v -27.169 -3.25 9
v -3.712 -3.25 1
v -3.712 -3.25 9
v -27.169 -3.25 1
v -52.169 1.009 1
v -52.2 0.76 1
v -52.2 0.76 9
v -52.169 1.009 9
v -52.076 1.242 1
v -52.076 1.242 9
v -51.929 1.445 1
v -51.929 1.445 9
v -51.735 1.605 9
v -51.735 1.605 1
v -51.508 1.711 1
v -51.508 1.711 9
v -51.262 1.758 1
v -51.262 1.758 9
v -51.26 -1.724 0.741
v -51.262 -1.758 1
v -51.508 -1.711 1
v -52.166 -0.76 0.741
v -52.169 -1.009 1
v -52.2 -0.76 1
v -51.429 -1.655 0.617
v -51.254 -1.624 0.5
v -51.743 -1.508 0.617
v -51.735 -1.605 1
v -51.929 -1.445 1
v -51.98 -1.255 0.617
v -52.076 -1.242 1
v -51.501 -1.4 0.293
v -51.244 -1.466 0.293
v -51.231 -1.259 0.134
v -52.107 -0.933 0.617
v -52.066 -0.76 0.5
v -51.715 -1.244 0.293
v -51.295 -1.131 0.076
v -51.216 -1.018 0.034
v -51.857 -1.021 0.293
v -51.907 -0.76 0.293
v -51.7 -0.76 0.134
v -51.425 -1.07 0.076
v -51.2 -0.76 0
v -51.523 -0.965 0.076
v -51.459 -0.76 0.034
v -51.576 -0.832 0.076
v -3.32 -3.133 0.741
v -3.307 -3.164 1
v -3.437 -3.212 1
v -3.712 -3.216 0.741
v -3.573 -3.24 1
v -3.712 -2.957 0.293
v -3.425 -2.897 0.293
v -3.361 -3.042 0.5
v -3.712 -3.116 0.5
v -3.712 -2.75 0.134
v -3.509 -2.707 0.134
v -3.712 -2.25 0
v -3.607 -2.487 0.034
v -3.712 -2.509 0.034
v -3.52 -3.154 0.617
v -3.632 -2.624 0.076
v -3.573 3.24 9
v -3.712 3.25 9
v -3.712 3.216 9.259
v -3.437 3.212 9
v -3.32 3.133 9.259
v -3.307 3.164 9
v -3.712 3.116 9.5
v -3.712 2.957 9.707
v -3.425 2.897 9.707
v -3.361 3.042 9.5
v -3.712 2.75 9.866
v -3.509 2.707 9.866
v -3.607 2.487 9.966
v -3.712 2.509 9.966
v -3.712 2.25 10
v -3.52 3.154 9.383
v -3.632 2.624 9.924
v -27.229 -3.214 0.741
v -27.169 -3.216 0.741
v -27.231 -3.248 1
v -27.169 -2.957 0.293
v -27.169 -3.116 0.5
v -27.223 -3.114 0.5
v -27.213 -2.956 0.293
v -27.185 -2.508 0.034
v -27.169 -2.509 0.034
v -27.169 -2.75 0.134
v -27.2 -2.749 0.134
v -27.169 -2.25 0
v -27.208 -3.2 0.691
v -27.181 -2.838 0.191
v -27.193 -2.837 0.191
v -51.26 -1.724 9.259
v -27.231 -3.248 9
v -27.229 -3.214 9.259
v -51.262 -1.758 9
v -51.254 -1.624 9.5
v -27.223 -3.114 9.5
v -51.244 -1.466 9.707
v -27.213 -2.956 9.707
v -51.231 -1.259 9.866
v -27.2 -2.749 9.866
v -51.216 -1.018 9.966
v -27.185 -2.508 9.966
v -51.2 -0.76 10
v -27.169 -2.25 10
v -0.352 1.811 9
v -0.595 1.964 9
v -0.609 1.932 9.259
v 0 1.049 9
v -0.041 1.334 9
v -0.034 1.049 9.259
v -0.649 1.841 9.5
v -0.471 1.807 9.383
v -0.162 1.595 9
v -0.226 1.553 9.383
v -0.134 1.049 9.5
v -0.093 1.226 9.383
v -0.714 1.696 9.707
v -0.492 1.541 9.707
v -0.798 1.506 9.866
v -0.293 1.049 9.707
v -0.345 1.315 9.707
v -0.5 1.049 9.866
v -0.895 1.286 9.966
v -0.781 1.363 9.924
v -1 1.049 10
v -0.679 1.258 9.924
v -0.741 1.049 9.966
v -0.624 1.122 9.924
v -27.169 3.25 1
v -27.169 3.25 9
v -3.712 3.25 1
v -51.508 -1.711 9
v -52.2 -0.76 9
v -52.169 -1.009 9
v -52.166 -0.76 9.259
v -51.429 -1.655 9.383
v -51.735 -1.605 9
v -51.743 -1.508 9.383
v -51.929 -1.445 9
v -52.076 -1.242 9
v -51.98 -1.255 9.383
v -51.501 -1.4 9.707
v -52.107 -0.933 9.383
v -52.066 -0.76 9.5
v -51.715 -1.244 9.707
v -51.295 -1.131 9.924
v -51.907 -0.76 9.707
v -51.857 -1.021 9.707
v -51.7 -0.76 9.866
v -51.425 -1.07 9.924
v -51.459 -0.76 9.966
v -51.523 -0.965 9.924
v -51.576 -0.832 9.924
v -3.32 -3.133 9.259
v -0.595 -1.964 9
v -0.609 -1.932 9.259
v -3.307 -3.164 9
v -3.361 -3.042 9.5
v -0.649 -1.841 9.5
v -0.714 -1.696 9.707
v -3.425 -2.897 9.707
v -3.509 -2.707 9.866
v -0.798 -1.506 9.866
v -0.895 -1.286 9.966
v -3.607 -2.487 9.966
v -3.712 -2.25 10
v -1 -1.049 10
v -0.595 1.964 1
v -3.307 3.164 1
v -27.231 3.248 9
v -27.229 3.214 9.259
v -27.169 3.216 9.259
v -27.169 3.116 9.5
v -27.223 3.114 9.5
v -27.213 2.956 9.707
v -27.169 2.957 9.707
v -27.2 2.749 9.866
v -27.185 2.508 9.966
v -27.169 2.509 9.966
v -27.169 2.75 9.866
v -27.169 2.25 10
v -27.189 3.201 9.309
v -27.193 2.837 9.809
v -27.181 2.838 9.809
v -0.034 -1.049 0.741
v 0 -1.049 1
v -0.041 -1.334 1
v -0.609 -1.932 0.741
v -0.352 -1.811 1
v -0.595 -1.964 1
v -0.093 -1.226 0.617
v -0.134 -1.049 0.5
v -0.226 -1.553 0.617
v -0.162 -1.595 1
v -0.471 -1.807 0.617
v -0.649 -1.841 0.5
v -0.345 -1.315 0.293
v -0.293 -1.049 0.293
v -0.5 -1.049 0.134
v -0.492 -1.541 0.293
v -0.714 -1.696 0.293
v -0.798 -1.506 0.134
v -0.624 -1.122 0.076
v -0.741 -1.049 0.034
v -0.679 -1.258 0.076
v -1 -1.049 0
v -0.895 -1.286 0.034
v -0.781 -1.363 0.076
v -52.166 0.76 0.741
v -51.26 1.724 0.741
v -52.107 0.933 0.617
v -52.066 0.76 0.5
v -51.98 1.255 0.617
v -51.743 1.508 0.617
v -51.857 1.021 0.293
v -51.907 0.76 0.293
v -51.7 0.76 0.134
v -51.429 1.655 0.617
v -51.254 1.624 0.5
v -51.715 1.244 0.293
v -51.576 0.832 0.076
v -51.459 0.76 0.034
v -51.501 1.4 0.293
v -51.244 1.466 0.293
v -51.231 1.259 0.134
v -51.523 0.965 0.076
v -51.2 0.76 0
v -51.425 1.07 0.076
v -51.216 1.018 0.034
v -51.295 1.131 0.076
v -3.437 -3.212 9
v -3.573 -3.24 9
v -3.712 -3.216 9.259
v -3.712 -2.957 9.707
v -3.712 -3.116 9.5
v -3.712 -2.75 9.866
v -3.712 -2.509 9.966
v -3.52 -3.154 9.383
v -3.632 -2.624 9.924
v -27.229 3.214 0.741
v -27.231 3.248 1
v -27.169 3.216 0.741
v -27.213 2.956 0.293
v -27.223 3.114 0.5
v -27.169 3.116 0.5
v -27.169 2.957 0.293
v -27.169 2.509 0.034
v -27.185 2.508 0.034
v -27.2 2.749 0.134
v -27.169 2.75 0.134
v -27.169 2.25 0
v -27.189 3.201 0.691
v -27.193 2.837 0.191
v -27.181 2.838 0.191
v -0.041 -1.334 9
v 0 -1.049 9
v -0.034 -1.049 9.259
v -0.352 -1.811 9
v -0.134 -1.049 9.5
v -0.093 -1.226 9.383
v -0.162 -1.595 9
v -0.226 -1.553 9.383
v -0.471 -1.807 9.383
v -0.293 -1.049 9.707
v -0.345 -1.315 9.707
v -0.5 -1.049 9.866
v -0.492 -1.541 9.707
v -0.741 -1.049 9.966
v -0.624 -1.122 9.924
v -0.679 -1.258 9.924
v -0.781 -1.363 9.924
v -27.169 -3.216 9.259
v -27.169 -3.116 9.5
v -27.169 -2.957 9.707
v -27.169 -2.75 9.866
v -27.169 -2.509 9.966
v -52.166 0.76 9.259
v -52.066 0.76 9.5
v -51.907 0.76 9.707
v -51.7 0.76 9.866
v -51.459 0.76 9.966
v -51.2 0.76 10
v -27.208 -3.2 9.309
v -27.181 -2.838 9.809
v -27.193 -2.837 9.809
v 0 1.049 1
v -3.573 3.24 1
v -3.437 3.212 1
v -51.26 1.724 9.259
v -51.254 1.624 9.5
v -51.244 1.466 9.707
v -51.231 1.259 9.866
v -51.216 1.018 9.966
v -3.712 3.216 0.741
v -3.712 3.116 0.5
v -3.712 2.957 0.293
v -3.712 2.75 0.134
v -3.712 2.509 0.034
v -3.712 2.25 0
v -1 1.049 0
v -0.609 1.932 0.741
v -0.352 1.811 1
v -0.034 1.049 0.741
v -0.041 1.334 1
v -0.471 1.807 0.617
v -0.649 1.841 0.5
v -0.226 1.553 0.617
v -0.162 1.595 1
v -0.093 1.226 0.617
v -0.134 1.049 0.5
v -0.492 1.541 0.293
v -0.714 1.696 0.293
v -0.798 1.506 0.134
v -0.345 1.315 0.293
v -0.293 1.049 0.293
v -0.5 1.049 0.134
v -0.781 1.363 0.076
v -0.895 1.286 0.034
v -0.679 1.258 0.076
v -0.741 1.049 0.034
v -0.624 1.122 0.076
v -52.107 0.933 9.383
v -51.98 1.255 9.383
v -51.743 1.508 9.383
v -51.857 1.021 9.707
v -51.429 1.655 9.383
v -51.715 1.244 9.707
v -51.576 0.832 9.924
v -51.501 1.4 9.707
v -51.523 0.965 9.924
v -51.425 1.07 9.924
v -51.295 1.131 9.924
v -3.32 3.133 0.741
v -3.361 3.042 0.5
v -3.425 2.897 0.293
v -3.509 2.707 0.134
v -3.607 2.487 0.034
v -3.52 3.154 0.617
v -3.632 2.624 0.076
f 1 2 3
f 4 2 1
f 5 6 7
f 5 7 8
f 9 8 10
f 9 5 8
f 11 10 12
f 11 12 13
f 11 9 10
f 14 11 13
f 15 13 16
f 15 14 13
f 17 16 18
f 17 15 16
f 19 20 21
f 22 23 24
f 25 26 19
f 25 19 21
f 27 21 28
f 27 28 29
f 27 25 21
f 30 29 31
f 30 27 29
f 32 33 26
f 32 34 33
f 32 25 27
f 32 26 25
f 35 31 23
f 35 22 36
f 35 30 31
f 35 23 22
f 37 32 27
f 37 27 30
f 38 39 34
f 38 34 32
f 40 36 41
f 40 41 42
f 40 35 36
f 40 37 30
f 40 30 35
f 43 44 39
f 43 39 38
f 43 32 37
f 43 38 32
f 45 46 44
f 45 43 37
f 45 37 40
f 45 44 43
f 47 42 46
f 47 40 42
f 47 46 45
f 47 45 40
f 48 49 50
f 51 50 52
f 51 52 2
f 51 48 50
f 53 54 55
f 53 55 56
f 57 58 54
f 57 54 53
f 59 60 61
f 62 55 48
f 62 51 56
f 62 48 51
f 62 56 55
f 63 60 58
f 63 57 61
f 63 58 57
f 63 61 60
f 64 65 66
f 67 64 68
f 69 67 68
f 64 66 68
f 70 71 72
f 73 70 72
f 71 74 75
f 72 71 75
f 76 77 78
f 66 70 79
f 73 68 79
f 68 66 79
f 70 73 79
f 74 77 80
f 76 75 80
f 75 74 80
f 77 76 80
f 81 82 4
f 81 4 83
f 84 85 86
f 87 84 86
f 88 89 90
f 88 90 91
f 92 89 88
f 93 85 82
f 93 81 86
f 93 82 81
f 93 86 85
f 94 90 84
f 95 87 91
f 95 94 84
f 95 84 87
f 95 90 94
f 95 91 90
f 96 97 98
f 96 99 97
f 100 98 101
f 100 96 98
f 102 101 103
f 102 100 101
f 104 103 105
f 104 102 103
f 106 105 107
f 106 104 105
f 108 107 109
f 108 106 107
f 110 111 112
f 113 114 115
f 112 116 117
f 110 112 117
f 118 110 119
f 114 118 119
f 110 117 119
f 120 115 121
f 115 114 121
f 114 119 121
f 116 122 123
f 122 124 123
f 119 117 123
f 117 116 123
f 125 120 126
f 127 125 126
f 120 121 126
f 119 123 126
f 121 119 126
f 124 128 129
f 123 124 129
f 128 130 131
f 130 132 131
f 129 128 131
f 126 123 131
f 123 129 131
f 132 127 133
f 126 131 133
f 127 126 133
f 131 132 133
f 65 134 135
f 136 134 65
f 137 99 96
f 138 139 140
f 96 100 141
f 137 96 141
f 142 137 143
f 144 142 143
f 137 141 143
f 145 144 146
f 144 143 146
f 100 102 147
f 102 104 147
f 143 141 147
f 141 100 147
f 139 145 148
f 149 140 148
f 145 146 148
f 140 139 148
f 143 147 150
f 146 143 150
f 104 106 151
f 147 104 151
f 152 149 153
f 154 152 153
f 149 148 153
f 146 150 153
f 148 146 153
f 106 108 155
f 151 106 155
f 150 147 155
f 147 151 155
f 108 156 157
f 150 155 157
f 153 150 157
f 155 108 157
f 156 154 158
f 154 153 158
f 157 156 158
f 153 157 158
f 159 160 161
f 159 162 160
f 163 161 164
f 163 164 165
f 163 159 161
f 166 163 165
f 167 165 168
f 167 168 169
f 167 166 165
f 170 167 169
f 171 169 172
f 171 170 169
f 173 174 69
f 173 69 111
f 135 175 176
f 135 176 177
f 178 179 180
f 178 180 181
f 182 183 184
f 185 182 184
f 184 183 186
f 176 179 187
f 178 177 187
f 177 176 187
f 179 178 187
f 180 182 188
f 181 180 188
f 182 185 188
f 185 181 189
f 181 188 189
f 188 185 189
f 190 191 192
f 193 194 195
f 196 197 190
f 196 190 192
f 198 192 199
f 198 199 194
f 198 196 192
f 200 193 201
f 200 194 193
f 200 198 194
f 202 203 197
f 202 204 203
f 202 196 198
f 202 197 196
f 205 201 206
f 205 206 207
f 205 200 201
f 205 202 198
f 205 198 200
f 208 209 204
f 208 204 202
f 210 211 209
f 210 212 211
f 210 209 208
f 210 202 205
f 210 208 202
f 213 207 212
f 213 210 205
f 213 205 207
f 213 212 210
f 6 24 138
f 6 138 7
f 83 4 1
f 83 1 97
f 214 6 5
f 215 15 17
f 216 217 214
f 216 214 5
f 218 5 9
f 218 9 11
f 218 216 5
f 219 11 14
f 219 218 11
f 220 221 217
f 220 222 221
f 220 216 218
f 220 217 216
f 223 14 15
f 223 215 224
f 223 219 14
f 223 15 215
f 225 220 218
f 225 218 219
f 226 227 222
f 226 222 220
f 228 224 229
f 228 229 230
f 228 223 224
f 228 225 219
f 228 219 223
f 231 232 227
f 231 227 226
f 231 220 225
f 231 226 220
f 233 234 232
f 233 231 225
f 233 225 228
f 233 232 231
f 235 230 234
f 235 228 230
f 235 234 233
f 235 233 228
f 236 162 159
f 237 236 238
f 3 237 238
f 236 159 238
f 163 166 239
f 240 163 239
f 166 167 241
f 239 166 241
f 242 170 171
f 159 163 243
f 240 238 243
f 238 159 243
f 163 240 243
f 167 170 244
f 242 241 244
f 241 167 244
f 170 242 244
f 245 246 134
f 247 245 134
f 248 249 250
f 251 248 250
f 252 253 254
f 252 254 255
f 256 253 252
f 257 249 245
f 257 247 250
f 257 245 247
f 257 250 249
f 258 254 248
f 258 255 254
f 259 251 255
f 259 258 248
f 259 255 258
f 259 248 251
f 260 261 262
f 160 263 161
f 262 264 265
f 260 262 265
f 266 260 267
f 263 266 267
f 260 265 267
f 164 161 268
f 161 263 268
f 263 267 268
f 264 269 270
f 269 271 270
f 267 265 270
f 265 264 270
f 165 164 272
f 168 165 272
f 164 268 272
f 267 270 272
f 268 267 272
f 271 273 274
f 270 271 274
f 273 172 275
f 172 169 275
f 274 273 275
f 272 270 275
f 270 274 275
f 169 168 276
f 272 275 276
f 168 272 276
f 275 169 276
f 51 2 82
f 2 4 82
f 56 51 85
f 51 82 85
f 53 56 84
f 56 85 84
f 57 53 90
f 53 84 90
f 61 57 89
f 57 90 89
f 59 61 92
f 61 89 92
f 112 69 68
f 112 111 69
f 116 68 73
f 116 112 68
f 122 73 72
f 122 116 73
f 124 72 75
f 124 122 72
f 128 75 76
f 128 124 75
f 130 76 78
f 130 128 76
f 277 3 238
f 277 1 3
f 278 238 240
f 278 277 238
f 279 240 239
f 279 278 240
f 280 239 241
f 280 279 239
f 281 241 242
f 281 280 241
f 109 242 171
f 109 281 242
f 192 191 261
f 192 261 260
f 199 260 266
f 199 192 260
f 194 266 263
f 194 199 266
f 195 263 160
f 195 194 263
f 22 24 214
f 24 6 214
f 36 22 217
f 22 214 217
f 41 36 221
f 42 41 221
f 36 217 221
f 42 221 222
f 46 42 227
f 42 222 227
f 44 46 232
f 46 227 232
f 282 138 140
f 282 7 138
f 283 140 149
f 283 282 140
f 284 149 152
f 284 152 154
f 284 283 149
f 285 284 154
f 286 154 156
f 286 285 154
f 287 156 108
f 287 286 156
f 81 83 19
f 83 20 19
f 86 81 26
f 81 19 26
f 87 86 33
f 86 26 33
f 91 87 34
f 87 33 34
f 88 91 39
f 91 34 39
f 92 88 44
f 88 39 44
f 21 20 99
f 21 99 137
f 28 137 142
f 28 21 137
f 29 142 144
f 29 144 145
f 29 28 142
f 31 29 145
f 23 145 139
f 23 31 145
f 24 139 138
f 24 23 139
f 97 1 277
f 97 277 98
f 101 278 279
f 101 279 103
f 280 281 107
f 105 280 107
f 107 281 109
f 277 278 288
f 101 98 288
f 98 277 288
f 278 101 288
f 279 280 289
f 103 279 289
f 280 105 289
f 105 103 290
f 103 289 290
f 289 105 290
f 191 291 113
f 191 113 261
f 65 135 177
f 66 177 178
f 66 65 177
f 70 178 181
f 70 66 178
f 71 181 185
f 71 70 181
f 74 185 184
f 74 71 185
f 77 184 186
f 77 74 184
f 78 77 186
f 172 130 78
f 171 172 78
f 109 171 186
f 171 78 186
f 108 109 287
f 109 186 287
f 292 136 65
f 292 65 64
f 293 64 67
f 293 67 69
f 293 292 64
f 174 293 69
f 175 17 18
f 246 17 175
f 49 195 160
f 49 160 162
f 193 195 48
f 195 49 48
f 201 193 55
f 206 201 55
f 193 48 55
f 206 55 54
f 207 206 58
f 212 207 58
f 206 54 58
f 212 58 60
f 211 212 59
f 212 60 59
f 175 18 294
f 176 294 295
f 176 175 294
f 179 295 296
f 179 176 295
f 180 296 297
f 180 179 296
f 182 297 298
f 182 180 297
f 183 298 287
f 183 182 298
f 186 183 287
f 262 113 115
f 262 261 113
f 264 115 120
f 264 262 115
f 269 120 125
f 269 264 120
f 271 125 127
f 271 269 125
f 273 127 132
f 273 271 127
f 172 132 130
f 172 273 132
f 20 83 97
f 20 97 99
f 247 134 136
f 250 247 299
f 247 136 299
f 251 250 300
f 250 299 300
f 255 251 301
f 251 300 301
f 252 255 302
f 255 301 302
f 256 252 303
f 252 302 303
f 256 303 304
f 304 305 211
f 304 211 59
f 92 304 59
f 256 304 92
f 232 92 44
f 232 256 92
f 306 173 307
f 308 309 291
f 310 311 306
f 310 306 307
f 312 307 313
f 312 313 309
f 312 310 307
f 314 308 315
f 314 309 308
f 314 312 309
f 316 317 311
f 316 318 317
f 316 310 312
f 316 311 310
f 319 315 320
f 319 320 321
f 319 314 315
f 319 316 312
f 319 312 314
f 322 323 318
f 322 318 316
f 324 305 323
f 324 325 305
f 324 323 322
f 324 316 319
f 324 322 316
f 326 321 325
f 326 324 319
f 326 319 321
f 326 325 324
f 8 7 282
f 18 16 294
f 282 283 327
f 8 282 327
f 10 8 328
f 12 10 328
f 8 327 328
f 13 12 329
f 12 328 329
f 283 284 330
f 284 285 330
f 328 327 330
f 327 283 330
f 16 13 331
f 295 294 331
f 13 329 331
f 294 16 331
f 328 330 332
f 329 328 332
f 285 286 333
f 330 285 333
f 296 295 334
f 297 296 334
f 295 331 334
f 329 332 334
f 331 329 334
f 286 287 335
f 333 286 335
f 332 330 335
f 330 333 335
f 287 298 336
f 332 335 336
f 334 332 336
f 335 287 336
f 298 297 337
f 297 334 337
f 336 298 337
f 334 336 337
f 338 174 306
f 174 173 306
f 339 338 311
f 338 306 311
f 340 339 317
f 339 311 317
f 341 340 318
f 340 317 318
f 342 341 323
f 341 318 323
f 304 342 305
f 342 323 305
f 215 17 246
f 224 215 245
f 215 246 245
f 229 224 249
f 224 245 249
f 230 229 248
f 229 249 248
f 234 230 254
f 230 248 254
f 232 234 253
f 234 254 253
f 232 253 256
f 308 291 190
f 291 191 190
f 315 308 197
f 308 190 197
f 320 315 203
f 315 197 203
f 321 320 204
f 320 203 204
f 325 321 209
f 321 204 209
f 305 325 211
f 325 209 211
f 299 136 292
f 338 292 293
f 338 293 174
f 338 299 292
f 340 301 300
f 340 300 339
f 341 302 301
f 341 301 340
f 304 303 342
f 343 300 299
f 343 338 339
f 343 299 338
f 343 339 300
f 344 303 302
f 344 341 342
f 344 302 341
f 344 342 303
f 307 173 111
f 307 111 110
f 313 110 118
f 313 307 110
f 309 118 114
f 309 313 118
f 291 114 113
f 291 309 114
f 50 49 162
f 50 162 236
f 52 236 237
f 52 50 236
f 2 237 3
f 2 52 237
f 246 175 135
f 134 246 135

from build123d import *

# Parameters (mm, degrees)
BOSS_EXTRUDE1_DEPTH = 10
FILLET1_R           = 1


with BuildPart() as part:
    # Sketch1 → Boss-Extrude1 (new body)
    with BuildSketch(Plane.XY):
        with BuildLine():
            Line((0, 1.049183312), (0, -1.049183312))
            ThreePointArc((0, -1.049183312), (-0.161869295, -1.594652762), (-0.595073842, -1.963532701))
            Line((-0.595073842, -1.963532701), (-3.306595396, -3.16434939))
            ThreePointArc((-3.306595396, -3.16434939), (-3.504578796, -3.228353052), (-3.711521554, -3.25))
            Line((-3.711521554, -3.25), (-27.169029734, -3.25))
            ThreePointArc((-27.169029734, -3.25), (-27.199985158, -3.249520766), (-27.230910912, -3.248083523))
            Line((-27.230910912, -3.248083523), (-51.261881178, -1.758163367))
            ThreePointArc((-51.261881178, -1.758163367), (-51.928656702, -1.444958965), (-52.2, -0.760079844))
            Line((-52.2, -0.760079844), (-52.2, 0.760079844))
            ThreePointArc((-52.2, 0.760079844), (-51.928656702, 1.444958965), (-51.261881178, 1.758163367))
            Line((-51.261881178, 1.758163367), (-27.230910912, 3.248083523))
            ThreePointArc((-27.230910912, 3.248083523), (-27.199985158, 3.249520766), (-27.169029734, 3.25))
            Line((-27.169029734, 3.25), (-3.711521554, 3.25))
            ThreePointArc((-3.711521554, 3.25), (-3.504578796, 3.228353052), (-3.306595396, 3.16434939))
            Line((-3.306595396, 3.16434939), (-0.595073842, 1.963532701))
            ThreePointArc((-0.595073842, 1.963532701), (-0.161869295, 1.594652762), (0, 1.049183312))
        make_face()
    extrude(amount=BOSS_EXTRUDE1_DEPTH)

    # Fillet1
    fillet1_edges = [part.edges().sort_by_distance(p)[0] for p in [
        (-3.504578796, -3.228353052, 10),
        (-1.950834619, -2.563941045, 10),
        (-39.246396045, -2.503123445, 0),
        (-51.928656702, -1.444958965, 0),
        (-52.2, 0, 0),
        (-51.928656702, 1.444958965, 0),
        (-39.246396045, 2.503123445, 0),
        (-0.161869295, -1.594652762, 10),
        (-27.199985158, 3.249520766, 0),
        (-15.440275644, 3.25, 0),
        (-3.504578796, 3.228353052, 0),
        (-1.950834619, 2.563941045, 0),
        (-0.161869295, 1.594652762, 0),
        (0, 0, 0),
        (-0.161869295, -1.594652762, 0),
        (-1.950834619, -2.563941045, 0),
        (0, 0, 10),
        (-3.504578796, -3.228353052, 0),
        (-15.440275644, -3.25, 0),
        (-27.199985158, -3.249520766, 0),
        (-0.161869295, 1.594652762, 10),
        (-1.950834619, 2.563941045, 10),
        (-3.504578796, 3.228353052, 10),
        (-15.440275644, 3.25, 10),
        (-27.199985158, 3.249520766, 10),
        (-39.246396045, 2.503123445, 10),
        (-27.199985158, -3.249520766, 10),
        (-51.928656702, 1.444958965, 10),
        (-52.2, 0, 10),
        (-51.928656702, -1.444958965, 10),
        (-39.246396045, -2.503123445, 10),
        (-15.440275644, -3.25, 10),
    ]]
    fillet(fillet1_edges, radius=FILLET1_R)


solid = part.part
